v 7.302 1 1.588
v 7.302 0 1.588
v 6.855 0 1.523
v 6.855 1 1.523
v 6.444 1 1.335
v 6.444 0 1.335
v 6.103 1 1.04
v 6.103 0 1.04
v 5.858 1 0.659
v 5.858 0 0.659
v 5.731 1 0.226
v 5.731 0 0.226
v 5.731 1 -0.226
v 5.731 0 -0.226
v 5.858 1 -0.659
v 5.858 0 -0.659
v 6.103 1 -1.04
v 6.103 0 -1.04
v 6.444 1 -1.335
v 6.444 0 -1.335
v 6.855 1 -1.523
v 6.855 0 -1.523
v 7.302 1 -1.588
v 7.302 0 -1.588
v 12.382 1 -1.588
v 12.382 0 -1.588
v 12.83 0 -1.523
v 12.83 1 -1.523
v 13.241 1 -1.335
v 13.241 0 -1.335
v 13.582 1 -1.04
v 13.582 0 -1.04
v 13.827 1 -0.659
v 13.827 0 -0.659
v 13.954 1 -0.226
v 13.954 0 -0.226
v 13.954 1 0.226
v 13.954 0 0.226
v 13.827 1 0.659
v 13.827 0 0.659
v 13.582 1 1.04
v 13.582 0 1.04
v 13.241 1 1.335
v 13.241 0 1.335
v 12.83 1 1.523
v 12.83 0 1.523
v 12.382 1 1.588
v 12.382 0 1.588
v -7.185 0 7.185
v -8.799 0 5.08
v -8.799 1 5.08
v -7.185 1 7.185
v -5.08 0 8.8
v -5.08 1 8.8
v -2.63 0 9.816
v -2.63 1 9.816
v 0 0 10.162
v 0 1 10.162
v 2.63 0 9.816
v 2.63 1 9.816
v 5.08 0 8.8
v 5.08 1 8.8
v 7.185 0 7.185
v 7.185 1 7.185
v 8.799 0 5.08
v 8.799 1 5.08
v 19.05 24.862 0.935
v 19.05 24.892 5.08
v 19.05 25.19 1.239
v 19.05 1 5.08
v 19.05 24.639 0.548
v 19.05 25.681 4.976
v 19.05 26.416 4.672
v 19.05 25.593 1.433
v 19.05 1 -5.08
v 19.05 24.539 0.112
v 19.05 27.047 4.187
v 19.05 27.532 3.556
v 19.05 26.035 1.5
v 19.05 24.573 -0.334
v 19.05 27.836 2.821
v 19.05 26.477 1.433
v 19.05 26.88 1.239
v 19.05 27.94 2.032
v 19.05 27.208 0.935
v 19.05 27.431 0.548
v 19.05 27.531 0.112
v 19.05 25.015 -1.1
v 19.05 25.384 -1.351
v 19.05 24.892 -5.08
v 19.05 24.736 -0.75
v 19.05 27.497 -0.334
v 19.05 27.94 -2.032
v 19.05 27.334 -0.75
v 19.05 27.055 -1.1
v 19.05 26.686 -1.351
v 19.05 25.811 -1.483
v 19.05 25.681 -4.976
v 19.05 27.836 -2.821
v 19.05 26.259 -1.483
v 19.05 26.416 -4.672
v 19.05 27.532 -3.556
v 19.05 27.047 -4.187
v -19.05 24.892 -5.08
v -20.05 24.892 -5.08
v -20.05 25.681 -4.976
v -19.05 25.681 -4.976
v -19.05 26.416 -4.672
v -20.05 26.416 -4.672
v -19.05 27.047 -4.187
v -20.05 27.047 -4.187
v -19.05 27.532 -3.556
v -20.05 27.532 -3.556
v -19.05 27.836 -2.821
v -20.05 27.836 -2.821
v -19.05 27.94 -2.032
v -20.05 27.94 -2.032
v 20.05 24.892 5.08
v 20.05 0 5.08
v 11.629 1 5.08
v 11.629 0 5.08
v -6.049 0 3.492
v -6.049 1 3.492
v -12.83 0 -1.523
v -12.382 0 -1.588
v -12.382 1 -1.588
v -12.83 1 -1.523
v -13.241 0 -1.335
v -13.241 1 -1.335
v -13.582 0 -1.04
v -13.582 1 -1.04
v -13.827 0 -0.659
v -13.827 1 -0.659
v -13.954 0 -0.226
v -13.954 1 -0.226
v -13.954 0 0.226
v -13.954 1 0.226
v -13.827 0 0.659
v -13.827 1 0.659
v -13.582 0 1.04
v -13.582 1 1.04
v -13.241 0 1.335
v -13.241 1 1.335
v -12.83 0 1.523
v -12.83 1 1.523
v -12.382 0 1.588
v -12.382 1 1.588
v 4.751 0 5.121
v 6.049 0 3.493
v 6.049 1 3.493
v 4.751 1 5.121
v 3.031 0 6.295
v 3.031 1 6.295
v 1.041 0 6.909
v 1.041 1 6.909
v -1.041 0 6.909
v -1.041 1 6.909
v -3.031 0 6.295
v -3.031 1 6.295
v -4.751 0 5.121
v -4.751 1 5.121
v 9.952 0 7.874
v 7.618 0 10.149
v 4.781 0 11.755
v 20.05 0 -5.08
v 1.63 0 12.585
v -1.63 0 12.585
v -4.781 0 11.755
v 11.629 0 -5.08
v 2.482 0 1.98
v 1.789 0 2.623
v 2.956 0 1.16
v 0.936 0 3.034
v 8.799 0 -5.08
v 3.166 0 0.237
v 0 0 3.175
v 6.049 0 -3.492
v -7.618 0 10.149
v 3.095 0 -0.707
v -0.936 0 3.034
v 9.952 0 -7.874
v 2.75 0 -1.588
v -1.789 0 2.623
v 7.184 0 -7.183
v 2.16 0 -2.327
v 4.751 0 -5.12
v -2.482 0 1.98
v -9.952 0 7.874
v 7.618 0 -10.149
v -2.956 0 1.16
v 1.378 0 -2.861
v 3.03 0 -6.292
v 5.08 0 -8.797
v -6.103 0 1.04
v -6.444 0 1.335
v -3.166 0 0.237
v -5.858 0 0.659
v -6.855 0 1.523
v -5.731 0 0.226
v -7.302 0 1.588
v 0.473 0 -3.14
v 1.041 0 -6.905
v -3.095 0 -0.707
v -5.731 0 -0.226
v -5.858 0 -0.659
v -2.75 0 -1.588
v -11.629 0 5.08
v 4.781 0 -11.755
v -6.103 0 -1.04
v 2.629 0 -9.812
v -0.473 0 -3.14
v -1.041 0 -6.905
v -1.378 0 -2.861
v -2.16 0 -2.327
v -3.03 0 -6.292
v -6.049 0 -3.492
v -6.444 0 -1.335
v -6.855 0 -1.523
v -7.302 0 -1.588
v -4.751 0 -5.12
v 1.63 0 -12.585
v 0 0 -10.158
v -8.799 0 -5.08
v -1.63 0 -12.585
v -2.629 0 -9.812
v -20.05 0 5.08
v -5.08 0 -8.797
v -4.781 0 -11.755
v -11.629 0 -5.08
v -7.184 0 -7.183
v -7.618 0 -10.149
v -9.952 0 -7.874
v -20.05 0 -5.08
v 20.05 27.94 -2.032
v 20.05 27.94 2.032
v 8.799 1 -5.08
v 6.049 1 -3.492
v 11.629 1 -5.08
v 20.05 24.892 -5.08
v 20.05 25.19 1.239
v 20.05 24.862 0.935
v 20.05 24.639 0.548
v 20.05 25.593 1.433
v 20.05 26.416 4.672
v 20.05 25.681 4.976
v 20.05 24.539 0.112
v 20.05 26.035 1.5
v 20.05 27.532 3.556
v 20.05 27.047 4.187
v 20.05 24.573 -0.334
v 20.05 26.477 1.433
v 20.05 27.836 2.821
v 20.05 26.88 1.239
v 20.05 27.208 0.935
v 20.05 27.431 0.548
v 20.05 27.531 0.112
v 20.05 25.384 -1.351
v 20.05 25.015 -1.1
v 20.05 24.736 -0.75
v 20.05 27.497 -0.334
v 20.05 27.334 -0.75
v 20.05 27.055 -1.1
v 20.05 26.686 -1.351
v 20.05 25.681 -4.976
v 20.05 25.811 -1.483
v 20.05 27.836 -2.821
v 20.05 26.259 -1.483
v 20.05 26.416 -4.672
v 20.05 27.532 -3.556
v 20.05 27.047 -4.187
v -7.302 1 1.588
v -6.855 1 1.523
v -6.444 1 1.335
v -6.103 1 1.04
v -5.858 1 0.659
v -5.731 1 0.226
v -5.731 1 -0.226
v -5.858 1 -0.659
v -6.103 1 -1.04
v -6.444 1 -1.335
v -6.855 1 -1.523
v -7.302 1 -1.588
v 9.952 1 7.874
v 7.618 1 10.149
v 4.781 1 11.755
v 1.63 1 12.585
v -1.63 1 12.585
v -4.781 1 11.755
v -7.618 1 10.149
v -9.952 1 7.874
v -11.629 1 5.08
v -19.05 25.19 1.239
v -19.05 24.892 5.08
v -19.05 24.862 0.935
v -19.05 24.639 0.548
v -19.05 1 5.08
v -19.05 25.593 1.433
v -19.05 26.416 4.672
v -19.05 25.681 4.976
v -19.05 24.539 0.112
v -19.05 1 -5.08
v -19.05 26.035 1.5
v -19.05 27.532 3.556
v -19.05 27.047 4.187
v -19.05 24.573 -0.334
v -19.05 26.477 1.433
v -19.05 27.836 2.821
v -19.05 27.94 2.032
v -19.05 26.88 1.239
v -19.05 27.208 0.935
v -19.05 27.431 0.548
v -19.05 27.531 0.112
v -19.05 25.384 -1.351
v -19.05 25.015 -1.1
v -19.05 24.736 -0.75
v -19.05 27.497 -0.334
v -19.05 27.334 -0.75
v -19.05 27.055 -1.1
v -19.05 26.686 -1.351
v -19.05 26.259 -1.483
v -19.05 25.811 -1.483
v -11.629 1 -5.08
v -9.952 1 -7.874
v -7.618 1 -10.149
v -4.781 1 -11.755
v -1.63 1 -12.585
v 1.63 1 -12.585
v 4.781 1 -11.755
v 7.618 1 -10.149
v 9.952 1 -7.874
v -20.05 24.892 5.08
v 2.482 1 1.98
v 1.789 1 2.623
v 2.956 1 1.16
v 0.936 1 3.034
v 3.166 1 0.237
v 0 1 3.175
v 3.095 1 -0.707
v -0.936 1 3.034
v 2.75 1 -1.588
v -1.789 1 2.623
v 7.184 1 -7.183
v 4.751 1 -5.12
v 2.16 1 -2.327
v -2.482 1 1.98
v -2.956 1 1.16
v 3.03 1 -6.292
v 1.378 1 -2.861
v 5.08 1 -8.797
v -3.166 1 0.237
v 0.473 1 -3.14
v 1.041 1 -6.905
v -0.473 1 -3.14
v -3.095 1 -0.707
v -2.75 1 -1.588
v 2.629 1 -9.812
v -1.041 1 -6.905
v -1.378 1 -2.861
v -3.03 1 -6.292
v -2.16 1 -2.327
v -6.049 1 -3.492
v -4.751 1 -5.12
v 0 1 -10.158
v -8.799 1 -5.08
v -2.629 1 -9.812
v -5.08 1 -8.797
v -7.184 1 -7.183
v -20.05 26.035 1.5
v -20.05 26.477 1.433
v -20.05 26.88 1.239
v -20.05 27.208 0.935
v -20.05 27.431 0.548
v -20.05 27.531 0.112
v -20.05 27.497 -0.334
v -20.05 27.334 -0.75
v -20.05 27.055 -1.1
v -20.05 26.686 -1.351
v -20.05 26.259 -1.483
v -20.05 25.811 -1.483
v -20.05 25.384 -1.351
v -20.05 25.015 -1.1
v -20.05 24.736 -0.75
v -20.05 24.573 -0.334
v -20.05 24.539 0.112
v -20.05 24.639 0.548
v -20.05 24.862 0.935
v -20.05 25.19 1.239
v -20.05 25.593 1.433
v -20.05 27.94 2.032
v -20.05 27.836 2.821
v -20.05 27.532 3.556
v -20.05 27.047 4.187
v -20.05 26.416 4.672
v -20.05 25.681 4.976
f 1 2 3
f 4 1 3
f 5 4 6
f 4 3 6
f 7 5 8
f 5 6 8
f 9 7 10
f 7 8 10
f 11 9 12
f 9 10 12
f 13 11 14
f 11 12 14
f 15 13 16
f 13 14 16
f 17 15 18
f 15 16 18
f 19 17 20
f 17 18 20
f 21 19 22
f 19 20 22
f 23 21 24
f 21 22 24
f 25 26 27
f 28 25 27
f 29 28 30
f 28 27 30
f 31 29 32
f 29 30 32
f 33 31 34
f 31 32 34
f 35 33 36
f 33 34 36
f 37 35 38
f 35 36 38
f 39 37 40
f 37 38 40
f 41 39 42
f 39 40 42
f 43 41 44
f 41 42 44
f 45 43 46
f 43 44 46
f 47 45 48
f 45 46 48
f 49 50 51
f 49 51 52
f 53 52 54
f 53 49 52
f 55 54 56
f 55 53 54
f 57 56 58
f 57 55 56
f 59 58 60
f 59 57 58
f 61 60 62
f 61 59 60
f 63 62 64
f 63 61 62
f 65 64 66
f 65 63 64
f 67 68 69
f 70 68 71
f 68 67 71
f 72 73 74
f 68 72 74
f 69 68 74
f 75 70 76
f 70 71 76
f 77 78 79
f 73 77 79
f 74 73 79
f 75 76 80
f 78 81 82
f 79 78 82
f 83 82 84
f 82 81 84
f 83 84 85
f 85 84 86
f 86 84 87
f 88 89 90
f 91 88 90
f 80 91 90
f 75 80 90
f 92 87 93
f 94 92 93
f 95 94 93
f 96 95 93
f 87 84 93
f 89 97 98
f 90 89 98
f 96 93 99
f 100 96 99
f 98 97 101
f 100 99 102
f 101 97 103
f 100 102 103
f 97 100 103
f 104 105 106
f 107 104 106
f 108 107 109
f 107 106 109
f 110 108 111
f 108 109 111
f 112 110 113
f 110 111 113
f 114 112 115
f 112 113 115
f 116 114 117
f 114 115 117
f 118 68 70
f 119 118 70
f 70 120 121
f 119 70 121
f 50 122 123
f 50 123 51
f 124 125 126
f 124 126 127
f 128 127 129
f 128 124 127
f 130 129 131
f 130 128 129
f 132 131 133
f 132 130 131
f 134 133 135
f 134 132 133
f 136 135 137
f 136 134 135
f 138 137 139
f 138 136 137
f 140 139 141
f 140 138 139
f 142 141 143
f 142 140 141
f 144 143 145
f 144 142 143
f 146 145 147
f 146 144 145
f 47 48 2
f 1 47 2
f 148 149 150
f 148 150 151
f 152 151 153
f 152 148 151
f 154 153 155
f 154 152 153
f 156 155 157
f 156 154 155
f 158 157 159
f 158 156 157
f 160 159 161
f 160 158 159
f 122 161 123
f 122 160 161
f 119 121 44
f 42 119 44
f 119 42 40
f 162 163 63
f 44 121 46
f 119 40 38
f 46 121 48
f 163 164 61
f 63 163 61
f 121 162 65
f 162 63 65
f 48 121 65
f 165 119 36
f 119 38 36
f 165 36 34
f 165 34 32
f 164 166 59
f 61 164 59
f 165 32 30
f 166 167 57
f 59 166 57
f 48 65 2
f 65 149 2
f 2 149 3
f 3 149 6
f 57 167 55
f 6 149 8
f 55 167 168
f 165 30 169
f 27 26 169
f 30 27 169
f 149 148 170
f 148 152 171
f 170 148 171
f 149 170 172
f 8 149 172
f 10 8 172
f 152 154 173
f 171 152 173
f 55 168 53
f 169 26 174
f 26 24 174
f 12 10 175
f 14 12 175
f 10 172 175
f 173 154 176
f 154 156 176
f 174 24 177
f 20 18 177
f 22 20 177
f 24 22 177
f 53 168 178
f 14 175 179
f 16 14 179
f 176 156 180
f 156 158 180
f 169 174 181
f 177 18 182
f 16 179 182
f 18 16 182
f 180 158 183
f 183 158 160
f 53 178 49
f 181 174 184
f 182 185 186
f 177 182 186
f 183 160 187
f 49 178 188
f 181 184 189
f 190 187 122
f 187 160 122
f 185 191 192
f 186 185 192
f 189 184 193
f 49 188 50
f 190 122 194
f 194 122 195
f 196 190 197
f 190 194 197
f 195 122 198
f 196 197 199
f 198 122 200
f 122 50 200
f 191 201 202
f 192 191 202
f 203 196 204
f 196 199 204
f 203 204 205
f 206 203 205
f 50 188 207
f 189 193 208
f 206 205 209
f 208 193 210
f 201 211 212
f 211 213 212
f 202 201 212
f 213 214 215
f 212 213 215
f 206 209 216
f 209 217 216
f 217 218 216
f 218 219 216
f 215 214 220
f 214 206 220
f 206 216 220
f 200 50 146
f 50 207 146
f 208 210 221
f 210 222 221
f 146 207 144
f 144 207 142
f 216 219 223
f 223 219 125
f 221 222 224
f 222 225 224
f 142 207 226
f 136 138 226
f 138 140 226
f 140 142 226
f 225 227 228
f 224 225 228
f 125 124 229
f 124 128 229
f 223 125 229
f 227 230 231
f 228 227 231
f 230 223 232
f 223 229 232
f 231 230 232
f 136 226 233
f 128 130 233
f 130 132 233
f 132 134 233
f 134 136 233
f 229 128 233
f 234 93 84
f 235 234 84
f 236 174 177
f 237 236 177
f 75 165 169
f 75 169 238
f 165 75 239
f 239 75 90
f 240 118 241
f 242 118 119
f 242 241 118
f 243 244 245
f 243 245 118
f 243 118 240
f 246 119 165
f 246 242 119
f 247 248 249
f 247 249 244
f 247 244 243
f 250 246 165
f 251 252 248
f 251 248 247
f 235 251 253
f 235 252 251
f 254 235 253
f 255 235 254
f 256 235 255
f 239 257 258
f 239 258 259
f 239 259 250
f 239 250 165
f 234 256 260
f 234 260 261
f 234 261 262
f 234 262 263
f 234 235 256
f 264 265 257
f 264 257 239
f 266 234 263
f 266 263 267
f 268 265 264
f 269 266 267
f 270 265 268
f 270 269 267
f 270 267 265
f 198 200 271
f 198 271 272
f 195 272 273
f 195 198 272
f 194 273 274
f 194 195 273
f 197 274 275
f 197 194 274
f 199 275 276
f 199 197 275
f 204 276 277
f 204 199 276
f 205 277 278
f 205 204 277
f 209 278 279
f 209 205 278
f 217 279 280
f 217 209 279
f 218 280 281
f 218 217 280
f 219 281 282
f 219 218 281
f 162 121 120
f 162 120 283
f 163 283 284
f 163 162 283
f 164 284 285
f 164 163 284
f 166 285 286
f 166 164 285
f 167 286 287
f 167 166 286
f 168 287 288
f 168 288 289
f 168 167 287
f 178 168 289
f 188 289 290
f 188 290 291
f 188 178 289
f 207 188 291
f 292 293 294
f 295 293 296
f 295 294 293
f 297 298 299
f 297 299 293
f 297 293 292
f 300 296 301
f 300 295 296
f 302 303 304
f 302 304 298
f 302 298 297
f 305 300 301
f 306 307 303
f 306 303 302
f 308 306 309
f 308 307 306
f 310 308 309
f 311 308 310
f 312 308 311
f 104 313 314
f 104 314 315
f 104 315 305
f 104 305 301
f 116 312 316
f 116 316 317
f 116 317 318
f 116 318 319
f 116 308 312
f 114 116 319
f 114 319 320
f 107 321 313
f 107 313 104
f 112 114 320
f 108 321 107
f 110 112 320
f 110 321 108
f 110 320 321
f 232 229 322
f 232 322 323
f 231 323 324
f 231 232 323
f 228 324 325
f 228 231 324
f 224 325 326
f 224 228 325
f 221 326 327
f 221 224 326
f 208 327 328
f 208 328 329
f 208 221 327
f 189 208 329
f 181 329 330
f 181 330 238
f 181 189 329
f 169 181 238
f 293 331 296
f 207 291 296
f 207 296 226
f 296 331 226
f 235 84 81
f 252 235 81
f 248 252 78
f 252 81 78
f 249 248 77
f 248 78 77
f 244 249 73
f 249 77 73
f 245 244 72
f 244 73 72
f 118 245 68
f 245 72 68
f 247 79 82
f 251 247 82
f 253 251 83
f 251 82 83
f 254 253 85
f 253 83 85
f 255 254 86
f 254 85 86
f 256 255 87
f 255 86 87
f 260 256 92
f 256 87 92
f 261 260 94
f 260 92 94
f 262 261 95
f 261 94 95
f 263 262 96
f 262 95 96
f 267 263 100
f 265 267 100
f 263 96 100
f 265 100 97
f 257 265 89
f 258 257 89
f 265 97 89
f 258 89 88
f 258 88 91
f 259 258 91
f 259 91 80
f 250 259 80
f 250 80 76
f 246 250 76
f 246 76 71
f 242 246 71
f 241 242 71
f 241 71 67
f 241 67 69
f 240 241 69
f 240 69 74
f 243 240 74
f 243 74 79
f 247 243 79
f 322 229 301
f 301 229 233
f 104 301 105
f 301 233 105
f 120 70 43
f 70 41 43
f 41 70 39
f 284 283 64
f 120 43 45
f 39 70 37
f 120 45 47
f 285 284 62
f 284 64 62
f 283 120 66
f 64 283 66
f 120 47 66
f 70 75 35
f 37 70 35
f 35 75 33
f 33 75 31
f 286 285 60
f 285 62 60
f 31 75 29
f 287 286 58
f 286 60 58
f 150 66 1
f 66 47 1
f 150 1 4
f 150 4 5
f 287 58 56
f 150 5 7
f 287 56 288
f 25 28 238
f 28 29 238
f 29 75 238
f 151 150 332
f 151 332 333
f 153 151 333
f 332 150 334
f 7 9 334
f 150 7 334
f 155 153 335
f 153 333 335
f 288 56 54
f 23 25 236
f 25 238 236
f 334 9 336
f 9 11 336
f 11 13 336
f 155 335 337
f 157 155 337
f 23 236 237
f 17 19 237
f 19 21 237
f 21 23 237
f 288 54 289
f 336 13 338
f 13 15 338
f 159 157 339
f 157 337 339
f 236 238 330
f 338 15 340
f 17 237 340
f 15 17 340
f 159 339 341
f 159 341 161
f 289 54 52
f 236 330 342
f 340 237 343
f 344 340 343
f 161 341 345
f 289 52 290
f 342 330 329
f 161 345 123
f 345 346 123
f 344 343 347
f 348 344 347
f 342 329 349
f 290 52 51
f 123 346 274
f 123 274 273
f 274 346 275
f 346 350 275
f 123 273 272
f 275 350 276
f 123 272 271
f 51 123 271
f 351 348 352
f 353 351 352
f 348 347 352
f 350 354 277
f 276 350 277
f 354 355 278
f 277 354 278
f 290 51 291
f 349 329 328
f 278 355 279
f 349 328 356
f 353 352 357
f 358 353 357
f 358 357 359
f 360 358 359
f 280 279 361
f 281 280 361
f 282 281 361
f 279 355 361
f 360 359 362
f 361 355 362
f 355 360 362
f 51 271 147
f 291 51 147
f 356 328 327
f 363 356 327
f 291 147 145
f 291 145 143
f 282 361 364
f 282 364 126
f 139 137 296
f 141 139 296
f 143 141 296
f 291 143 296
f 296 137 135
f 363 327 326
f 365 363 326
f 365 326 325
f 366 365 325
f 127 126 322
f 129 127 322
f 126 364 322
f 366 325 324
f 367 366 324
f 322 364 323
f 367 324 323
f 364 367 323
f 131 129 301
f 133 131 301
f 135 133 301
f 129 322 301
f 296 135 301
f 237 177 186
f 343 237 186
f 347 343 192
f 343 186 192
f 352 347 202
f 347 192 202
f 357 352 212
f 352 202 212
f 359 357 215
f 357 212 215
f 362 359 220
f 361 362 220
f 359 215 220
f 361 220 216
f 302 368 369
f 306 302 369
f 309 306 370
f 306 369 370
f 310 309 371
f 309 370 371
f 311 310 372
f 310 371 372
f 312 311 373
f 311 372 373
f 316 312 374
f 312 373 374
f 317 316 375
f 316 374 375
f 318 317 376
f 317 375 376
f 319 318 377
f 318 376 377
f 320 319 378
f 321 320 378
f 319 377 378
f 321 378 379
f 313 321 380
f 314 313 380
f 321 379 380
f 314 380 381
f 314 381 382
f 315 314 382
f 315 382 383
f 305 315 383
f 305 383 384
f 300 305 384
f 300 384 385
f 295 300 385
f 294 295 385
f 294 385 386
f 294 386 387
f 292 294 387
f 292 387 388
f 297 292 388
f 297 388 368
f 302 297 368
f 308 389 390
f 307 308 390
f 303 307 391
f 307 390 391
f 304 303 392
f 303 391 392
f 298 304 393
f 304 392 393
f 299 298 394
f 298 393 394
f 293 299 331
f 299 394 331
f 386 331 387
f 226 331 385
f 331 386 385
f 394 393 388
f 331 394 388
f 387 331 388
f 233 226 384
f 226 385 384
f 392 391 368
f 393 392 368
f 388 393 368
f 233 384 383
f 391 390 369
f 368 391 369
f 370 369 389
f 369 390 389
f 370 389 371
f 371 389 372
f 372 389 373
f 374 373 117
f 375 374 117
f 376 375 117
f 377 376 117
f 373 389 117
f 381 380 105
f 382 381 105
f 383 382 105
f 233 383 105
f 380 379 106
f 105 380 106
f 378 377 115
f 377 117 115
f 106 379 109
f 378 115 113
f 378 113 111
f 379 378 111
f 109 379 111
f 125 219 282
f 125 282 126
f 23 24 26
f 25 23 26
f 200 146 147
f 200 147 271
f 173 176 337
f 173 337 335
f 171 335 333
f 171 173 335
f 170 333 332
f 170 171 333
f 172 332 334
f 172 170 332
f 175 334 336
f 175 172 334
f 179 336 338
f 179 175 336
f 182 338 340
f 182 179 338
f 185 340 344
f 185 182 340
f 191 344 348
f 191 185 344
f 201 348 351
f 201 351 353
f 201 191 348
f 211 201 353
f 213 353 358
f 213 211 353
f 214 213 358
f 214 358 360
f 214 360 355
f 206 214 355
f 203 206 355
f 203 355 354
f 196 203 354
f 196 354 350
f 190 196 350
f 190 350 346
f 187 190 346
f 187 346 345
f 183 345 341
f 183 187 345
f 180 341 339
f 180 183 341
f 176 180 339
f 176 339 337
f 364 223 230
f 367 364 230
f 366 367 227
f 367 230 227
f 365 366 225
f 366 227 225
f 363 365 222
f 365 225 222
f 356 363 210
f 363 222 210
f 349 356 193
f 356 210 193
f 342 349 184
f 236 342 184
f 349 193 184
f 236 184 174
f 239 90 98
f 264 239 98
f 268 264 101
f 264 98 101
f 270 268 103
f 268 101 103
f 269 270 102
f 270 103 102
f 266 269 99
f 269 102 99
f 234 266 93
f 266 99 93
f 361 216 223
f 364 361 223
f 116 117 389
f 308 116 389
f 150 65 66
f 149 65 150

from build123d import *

# Parameters (mm, degrees)
SKETCH1_R           = 3.175
BOSS_EXTRUDE1_DEPTH = 1
BOSS_EXTRUDE2_DEPTH = 1
BOSS_EXTRUDE3_START = 1
BOSS_EXTRUDE3_DEPTH = 1
SKETCH4_R           = 1.5
CUT_EXTRUDE1_DEPTH  = 51.4944901


with BuildPart() as part:
    # Sketch1 → Boss-Extrude1 (new body)
    with BuildSketch(Plane(origin=(0, 0, 0), x_dir=(1, 0, 0), z_dir=(0, 1, 0))):
        with BuildLine():
            Line((11.628995247, 5.08), (19.05, 5.08))
            Line((19.05, 5.08), (19.05, -5.08))
            Line((19.05, -5.08), (11.628995247, -5.08))
            ThreePointArc((11.628995247, -5.08), (0, -12.690150923), (-11.628995247, -5.08))
            Line((-11.628995247, -5.08), (-19.05, -5.08))
            Line((-19.05, -5.08), (-19.05, 5.08))
            Line((-19.05, 5.08), (-11.628995247, 5.08))
            ThreePointArc((-11.628995247, 5.08), (0, 12.690150923), (11.628995247, 5.08))
        make_face()
        with Locations(Location((0, 0, 0), (0, 0, 270))):
            Circle(SKETCH1_R, mode=Mode.SUBTRACT)
        with BuildLine():
            Line((8.798818102, 5.08), (6.049187445, 3.4925))
            ThreePointArc((6.049187445, 3.4925), (0, 6.983078605), (-6.049187445, 3.4925))
            Line((-6.049187445, 3.4925), (-8.798818102, 5.08))
            ThreePointArc((-8.798818102, 5.08), (0, 10.158078357), (8.798818102, 5.08))
        make_face(mode=Mode.SUBTRACT)
        with BuildLine():
            Line((8.798818102, -5.08), (6.049187445, -3.4925))
            ThreePointArc((6.049187445, -3.4925), (0, -6.986922982), (-6.049187445, -3.4925))
            Line((-6.049187445, -3.4925), (-8.798818102, -5.08))
            ThreePointArc((-8.798818102, -5.08), (0, -10.161922734), (8.798818102, -5.08))
        make_face(mode=Mode.SUBTRACT)
        with BuildLine():
            Line((12.3825, -1.5875), (7.3025, -1.5875))
            ThreePointArc((7.3025, -1.5875), (5.715, 0), (7.3025, 1.5875))
            Line((7.3025, 1.5875), (12.3825, 1.5875))
            ThreePointArc((12.3825, 1.5875), (13.97, 0), (12.3825, -1.5875))
        make_face(mode=Mode.SUBTRACT)
        with BuildLine():
            Line((-7.3025, 1.5875), (-12.3825, 1.5875))
            ThreePointArc((-12.3825, 1.5875), (-13.97, 0), (-12.3825, -1.5875))
            Line((-12.3825, -1.5875), (-7.3025, -1.5875))
            ThreePointArc((-7.3025, -1.5875), (-5.715, 0), (-7.3025, 1.5875))
        make_face(mode=Mode.SUBTRACT)
    extrude(amount=BOSS_EXTRUDE1_DEPTH)

    # Sketch2 → Boss-Extrude2 (add)
    with BuildSketch(Plane(origin=(19.05, 0, -13.97), x_dir=(0, 0, -1), z_dir=(1, 0, 0))):
        with BuildLine():
            Line((-19.05, 0), (-8.89, 0))
            Line((-8.89, 0), (-8.89, 24.892))
            ThreePointArc((-8.89, 24.892), (-9.782738531, 27.047261469), (-11.938, 27.94))
            Line((-11.938, 27.94), (-16.002, 27.94))
            ThreePointArc((-16.002, 27.94), (-18.157261469, 27.047261469), (-19.05, 24.892))
            Line((-19.05, 24.892), (-19.05, 0))
        make_face()
    extrude(amount=BOSS_EXTRUDE2_DEPTH)

    # Sketch3 → Boss-Extrude3 (add)
    with BuildSketch(Plane(origin=(-19.05, 0, 13.97), x_dir=(0, 0, 1), z_dir=(-1, 0, 0)).offset(BOSS_EXTRUDE3_START)):
        with BuildLine():
            Line((-8.89, 0), (-19.05, 0))
            Line((-19.05, 0), (-19.05, 24.892))
            ThreePointArc((-19.05, 24.892), (-18.157261469, 27.047261469), (-16.002, 27.94))
            Line((-16.002, 27.94), (-11.938, 27.94))
            ThreePointArc((-11.938, 27.94), (-9.782738531, 27.047261469), (-8.89, 24.892))
            Line((-8.89, 24.892), (-8.89, 0))
        make_face()
    extrude(amount=-BOSS_EXTRUDE3_DEPTH)

    # Sketch4 → Cut-Extrude1 (cut, through all)
    with BuildSketch(Plane.ZY.offset(20.05)):
        with Locations((0, 26.035)):
            Circle(SKETCH4_R)
    extrude(amount=-CUT_EXTRUDE1_DEPTH, mode=Mode.SUBTRACT)


solid = part.part
